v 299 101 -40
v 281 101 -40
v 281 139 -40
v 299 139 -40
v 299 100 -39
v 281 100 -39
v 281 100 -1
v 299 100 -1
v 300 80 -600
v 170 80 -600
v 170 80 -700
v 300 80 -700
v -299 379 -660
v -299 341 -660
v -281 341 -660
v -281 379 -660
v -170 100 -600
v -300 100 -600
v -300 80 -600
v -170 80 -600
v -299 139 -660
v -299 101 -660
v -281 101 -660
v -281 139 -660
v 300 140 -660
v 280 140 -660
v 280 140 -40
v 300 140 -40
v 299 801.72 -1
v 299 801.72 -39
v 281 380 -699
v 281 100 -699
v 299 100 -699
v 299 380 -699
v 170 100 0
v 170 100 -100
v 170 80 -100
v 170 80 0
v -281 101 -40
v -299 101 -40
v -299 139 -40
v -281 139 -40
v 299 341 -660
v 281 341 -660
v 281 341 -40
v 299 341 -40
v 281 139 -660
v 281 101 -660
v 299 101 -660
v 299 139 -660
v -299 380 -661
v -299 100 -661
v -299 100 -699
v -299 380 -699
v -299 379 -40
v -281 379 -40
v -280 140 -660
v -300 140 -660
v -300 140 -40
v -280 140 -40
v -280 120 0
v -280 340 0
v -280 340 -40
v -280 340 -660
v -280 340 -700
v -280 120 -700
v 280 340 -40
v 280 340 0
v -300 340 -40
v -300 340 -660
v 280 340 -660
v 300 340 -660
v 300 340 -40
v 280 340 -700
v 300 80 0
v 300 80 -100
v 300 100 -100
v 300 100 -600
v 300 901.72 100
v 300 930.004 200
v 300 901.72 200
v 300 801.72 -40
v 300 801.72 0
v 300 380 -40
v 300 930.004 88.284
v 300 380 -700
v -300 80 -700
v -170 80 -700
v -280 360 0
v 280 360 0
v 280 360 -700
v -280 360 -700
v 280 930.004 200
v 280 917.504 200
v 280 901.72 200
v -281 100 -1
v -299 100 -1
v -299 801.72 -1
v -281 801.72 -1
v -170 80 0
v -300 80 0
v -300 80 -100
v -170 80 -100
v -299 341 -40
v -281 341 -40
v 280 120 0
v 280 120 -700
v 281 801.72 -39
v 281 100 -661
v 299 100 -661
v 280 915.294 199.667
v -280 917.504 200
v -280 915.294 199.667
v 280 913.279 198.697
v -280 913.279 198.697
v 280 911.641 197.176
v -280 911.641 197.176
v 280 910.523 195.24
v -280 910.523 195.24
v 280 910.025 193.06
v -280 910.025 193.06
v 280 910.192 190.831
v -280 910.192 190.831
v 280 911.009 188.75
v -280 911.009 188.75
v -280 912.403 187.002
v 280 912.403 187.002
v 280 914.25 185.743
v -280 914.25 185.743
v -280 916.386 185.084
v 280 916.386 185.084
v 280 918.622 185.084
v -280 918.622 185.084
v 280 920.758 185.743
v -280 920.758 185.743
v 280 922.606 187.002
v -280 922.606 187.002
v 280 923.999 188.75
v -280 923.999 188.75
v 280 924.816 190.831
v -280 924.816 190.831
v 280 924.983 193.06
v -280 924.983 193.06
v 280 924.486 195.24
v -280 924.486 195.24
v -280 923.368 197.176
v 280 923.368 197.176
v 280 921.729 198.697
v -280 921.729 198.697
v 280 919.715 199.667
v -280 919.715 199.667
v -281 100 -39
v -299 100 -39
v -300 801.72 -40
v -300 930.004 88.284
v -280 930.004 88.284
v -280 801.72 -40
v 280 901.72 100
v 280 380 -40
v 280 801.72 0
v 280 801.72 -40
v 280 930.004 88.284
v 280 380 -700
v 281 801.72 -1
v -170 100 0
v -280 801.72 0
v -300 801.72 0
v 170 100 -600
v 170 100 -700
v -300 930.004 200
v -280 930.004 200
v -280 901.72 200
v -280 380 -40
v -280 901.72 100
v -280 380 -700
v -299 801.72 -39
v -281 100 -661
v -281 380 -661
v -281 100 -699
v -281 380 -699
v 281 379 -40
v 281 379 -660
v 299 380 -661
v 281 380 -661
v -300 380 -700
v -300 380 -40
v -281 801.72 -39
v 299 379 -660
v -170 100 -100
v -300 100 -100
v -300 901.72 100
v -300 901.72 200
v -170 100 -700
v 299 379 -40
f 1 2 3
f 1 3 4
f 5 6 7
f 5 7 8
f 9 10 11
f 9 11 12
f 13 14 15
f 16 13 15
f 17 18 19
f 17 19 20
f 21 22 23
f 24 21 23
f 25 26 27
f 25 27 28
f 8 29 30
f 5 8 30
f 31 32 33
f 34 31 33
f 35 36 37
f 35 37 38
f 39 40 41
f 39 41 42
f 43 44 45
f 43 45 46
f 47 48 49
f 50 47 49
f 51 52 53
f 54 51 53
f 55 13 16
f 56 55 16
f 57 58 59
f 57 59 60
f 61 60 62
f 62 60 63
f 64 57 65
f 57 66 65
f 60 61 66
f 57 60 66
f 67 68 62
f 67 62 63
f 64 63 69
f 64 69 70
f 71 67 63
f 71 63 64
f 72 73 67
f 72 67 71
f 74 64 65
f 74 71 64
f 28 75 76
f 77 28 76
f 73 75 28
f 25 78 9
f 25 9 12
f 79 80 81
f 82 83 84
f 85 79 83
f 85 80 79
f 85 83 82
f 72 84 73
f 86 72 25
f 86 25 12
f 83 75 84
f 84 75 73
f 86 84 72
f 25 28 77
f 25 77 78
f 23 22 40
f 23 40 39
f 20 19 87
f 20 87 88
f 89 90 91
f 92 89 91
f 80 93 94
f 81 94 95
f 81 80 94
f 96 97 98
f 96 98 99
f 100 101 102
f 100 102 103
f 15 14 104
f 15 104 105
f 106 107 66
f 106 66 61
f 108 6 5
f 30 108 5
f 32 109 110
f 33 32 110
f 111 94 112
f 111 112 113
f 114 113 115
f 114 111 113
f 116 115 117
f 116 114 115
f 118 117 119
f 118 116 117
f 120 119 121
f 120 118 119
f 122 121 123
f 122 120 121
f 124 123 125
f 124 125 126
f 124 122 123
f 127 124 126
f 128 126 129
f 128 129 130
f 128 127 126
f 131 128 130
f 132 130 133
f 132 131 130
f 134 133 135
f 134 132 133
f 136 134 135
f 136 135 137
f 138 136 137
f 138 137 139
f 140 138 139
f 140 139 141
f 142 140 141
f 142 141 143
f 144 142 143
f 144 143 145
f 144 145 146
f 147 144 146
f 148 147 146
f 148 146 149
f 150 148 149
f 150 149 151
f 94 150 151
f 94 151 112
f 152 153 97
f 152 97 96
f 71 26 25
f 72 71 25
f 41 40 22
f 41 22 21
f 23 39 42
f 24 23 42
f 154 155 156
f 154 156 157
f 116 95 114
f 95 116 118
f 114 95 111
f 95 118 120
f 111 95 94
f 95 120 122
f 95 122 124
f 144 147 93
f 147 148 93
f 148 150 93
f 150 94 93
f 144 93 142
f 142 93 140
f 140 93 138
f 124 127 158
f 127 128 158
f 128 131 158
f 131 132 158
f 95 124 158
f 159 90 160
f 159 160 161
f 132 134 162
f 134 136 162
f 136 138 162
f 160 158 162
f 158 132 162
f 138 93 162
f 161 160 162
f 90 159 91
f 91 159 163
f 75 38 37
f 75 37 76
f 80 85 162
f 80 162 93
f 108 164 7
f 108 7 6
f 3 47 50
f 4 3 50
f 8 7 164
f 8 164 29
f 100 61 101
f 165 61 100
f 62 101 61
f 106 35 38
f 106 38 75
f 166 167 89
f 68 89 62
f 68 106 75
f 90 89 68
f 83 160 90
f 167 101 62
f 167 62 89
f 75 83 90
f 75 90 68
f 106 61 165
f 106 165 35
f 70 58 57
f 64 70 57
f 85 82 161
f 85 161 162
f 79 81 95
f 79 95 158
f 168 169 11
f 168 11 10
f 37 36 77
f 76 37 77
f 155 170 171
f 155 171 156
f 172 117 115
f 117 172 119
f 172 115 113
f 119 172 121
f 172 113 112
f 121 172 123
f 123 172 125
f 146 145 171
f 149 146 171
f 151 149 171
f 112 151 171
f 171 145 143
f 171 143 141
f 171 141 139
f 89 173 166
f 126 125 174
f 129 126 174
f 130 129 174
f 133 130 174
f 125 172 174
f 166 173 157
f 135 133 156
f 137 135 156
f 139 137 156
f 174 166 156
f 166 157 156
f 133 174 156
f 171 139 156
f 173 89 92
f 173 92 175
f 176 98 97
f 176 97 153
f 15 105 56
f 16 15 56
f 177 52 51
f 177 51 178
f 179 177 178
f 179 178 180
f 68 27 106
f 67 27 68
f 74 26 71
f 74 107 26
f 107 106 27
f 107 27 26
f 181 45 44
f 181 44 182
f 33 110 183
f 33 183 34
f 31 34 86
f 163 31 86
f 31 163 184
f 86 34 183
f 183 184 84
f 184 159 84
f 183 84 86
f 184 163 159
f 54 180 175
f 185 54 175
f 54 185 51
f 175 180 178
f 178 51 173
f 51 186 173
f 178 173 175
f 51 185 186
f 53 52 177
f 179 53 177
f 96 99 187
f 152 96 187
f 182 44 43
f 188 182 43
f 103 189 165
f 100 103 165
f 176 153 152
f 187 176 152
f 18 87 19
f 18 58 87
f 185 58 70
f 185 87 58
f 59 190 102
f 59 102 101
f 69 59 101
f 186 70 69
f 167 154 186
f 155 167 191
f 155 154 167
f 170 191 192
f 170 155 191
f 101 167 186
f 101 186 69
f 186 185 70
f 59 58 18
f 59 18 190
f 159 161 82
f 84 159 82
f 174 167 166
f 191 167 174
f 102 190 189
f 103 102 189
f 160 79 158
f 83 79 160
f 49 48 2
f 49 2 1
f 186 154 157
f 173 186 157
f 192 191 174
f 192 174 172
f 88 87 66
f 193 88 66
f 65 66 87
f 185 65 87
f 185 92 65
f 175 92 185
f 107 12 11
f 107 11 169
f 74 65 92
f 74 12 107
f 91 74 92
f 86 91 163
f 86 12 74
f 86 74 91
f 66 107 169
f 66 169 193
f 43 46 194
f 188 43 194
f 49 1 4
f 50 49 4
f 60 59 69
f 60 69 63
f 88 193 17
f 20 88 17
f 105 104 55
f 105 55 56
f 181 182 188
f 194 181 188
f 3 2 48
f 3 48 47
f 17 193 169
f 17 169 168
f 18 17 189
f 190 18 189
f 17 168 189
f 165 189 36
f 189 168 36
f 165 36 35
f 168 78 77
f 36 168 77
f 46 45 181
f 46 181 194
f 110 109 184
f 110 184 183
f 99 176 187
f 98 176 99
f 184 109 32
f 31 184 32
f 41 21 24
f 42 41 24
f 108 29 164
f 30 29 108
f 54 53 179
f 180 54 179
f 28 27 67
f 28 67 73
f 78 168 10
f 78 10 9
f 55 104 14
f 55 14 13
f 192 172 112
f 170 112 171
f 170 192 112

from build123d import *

# Parameters (mm, degrees)
EXTRUDE_THIN1_START             = 100
EXTRUDE_THIN1_OUTLINE_W         = 20
EXTRUDE_THIN1_OUTLINE_H         = 40
EXTRUDE_THIN1_OUTLINE_W_2       = 18
EXTRUDE_THIN1_OUTLINE_H_2       = 38
EXTRUDE_THIN1_DEPTH             = 701.72
SKETCH5_W                       = 20
SKETCH5_H                       = 40
SKETCH5_W_2                     = 18
SKETCH5_H_2                     = 38
EXTRUDE_THIN2_DEPTH             = 620
SKETCH6_W                       = 20
SKETCH6_H                       = 421.72
CUT_EXTRUDE1_DEPTH              = 1081.904694411
BOSS_EXTRUDE1_REACH             = 1107.783
SKETCH8_W                       = 700
SKETCH8_H                       = 20
BOSS_EXTRUDE1_DIRECTION_2_REACH = 1107.783
BOSS_EXTRUDE2_REACH             = 1214.087
SKETCH9_W                       = 700
SKETCH9_H                       = 20
BOSS_EXTRUDE3_DEPTH             = 20
BOSS_EXTRUDE4_DEPTH             = 20
BOSS_EXTRUDE5_REACH             = 1311.545
SKETCH12_R                      = 7.5
SKETCH16_W                      = 130
SKETCH16_H                      = 100
BOSS_EXTRUDE6_DEPTH             = 20


# Read off the part's stored shape, not the designer's step: Extrude-Thin1
with BuildPart() as part:
    # Extrude-Thin1 outline → Extrude-Thin1 (new body)
    # profile 1 of 4: a face of its own
    with BuildSketch(Plane(origin=(0, 0, 0), x_dir=(1, 0, 0), z_dir=(0, 1, 0)).offset(EXTRUDE_THIN1_START)):
        with Locations((-290, 680)):
            Rectangle(EXTRUDE_THIN1_OUTLINE_W, EXTRUDE_THIN1_OUTLINE_H)
        with Locations((-290, 680)):
            Rectangle(EXTRUDE_THIN1_OUTLINE_W_2, EXTRUDE_THIN1_OUTLINE_H_2, mode=Mode.SUBTRACT)
    # profile 2 of 4: a face of its own
    with BuildSketch(Plane(origin=(0, 0, 0), x_dir=(1, 0, 0), z_dir=(0, 1, 0)).offset(EXTRUDE_THIN1_START)):
        with Locations((290, 680)):
            Rectangle(EXTRUDE_THIN1_OUTLINE_W, EXTRUDE_THIN1_OUTLINE_H)
        with Locations((290, 680)):
            Rectangle(EXTRUDE_THIN1_OUTLINE_W_2, EXTRUDE_THIN1_OUTLINE_H_2, mode=Mode.SUBTRACT)
    # profile 3 of 4: a face of its own
    with BuildSketch(Plane(origin=(0, 0, 0), x_dir=(1, 0, 0), z_dir=(0, 1, 0)).offset(EXTRUDE_THIN1_START)):
        with Locations((290, 20)):
            Rectangle(EXTRUDE_THIN1_OUTLINE_W, EXTRUDE_THIN1_OUTLINE_H)
        with Locations((290, 20)):
            Rectangle(EXTRUDE_THIN1_OUTLINE_W_2, EXTRUDE_THIN1_OUTLINE_H_2, mode=Mode.SUBTRACT)
    # profile 4 of 4: a face of its own
    with BuildSketch(Plane(origin=(0, 0, 0), x_dir=(1, 0, 0), z_dir=(0, 1, 0)).offset(EXTRUDE_THIN1_START)):
        with Locations((-290, 20)):
            Rectangle(EXTRUDE_THIN1_OUTLINE_W, EXTRUDE_THIN1_OUTLINE_H)
        with Locations((-290, 20)):
            Rectangle(EXTRUDE_THIN1_OUTLINE_W_2, EXTRUDE_THIN1_OUTLINE_H_2, mode=Mode.SUBTRACT)
    extrude(amount=EXTRUDE_THIN1_DEPTH)

    # Sketch5 → Extrude-Thin2 (add)
    # profile 1 of 4: a face of its own
    with BuildSketch(Plane.XY.offset(-660)):
        with Locations((-290, 360)):
            Rectangle(SKETCH5_W, SKETCH5_H)
        with Locations((-290, 360)):
            Rectangle(SKETCH5_W_2, SKETCH5_H_2, mode=Mode.SUBTRACT)
    # profile 2 of 4: a face of its own
    with BuildSketch(Plane.XY.offset(-660)):
        with Locations((290, 360)):
            Rectangle(SKETCH5_W, SKETCH5_H)
        with Locations((290, 360)):
            Rectangle(SKETCH5_W_2, SKETCH5_H_2, mode=Mode.SUBTRACT)
    # profile 3 of 4: a face of its own
    with BuildSketch(Plane.XY.offset(-660)):
        with Locations((-290, 120)):
            Rectangle(SKETCH5_W, SKETCH5_H)
        with Locations((-290, 120)):
            Rectangle(SKETCH5_W_2, SKETCH5_H_2, mode=Mode.SUBTRACT)
    # profile 4 of 4: a face of its own
    with BuildSketch(Plane.XY.offset(-660)):
        with Locations((290, 120)):
            Rectangle(SKETCH5_W, SKETCH5_H)
        with Locations((290, 120)):
            Rectangle(SKETCH5_W_2, SKETCH5_H_2, mode=Mode.SUBTRACT)
    extrude(amount=EXTRUDE_THIN2_DEPTH)

    # Sketch6 → Cut-Extrude1 (cut, through all)
    with BuildSketch(Plane.XY.offset(-660)):
        with Locations((290, 590.86)):
            Rectangle(SKETCH6_W, SKETCH6_H)
        with Locations((-290, 590.86)):
            Rectangle(SKETCH6_W, SKETCH6_H)
    extrude(amount=-CUT_EXTRUDE1_DEPTH, mode=Mode.SUBTRACT)

    # Sketch8 → Boss-Extrude1 (add, up to next)
    with BuildSketch(Plane(origin=(0, 0, 0), x_dir=(0, 0, -1), z_dir=(1, 0, 0)), mode=Mode.PRIVATE) as boss_extrude1_sk1:
        with Locations((350, 350)):
            Rectangle(SKETCH8_W, SKETCH8_H)
    boss_extrude1_tool1 = extrude(boss_extrude1_sk1.sketch, amount=BOSS_EXTRUDE1_REACH, mode=Mode.PRIVATE) - part.part
    add(boss_extrude1_tool1.solids().sort_by_distance((0, 350, -350))[0])

    # Sketch8 → Boss-Extrude1 direction 2 (add, up to next)
    with BuildSketch(Plane(origin=(0, 0, 0), x_dir=(0, 0, -1), z_dir=(1, 0, 0)), mode=Mode.PRIVATE) as boss_extrude1_direction_2_sk1:
        with Locations((350, 350)):
            Rectangle(SKETCH8_W, SKETCH8_H)
    boss_extrude1_direction_2_tool1 = extrude(boss_extrude1_direction_2_sk1.sketch, amount=-BOSS_EXTRUDE1_DIRECTION_2_REACH, mode=Mode.PRIVATE) - part.part
    add(boss_extrude1_direction_2_tool1.solids().sort_by_distance((0, 350, -350))[0])

    # Sketch9 → Boss-Extrude2 (add, up to next)
    with BuildSketch(Plane.ZY.offset(-280), mode=Mode.PRIVATE) as boss_extrude2_sk1:
        with Locations((-350, 110)):
            Rectangle(SKETCH9_W, SKETCH9_H)
    boss_extrude2_tool1 = extrude(boss_extrude2_sk1.sketch, amount=BOSS_EXTRUDE2_REACH, mode=Mode.PRIVATE) - part.part
    add(boss_extrude2_tool1.solids().sort_by_distance((280, 110, -350))[0])

    # Sketch10 → Boss-Extrude3 (add)
    with BuildSketch(Plane(origin=(300, 0, 0), x_dir=(0, 0, -1), z_dir=(1, 0, 0))):
        Polygon((-200, 901.72), (-100, 901.72), (0, 801.72), (40, 801.72), (-88.284271247, 930.004271247), (-200, 930.004271247), align=None)
    extrude(amount=-BOSS_EXTRUDE3_DEPTH)

    # Sketch11 → Boss-Extrude4 (add)
    with BuildSketch(Plane.ZY.offset(300)):
        Polygon((-40, 801.72), (0, 801.72), (100, 901.72), (200, 901.72), (200, 930.004271247), (88.284271247, 930.004271247), align=None)
    extrude(amount=-BOSS_EXTRUDE4_DEPTH)

    # Sketch12 → Boss-Extrude5 (add, up to next)
    with BuildSketch(Plane(origin=(300, 0, 0), x_dir=(0, 0, -1), z_dir=(1, 0, 0)), mode=Mode.PRIVATE) as boss_extrude5_sk1:
        with Locations(Location((-192.5, 917.504271247, 0), (0, 0, 180))):
            Circle(SKETCH12_R)
    boss_extrude5_tool1 = extrude(boss_extrude5_sk1.sketch, amount=-BOSS_EXTRUDE5_REACH, mode=Mode.PRIVATE) - part.part
    add(boss_extrude5_tool1.solids().sort_by_distance((300, 917.504271, 192.5))[0])

    # Sketch16 → Boss-Extrude6 (add)
    with BuildSketch(Plane.XZ.offset(-100)):
        with Locations((-235, -50)):
            Rectangle(SKETCH16_W, SKETCH16_H)
        with Locations((235, -50)):
            Rectangle(SKETCH16_W, SKETCH16_H)
        with Locations((235, -650)):
            Rectangle(SKETCH16_W, SKETCH16_H)
        with Locations((-235, -650)):
            Rectangle(SKETCH16_W, SKETCH16_H)
    extrude(amount=BOSS_EXTRUDE6_DEPTH)


solid = part.part
